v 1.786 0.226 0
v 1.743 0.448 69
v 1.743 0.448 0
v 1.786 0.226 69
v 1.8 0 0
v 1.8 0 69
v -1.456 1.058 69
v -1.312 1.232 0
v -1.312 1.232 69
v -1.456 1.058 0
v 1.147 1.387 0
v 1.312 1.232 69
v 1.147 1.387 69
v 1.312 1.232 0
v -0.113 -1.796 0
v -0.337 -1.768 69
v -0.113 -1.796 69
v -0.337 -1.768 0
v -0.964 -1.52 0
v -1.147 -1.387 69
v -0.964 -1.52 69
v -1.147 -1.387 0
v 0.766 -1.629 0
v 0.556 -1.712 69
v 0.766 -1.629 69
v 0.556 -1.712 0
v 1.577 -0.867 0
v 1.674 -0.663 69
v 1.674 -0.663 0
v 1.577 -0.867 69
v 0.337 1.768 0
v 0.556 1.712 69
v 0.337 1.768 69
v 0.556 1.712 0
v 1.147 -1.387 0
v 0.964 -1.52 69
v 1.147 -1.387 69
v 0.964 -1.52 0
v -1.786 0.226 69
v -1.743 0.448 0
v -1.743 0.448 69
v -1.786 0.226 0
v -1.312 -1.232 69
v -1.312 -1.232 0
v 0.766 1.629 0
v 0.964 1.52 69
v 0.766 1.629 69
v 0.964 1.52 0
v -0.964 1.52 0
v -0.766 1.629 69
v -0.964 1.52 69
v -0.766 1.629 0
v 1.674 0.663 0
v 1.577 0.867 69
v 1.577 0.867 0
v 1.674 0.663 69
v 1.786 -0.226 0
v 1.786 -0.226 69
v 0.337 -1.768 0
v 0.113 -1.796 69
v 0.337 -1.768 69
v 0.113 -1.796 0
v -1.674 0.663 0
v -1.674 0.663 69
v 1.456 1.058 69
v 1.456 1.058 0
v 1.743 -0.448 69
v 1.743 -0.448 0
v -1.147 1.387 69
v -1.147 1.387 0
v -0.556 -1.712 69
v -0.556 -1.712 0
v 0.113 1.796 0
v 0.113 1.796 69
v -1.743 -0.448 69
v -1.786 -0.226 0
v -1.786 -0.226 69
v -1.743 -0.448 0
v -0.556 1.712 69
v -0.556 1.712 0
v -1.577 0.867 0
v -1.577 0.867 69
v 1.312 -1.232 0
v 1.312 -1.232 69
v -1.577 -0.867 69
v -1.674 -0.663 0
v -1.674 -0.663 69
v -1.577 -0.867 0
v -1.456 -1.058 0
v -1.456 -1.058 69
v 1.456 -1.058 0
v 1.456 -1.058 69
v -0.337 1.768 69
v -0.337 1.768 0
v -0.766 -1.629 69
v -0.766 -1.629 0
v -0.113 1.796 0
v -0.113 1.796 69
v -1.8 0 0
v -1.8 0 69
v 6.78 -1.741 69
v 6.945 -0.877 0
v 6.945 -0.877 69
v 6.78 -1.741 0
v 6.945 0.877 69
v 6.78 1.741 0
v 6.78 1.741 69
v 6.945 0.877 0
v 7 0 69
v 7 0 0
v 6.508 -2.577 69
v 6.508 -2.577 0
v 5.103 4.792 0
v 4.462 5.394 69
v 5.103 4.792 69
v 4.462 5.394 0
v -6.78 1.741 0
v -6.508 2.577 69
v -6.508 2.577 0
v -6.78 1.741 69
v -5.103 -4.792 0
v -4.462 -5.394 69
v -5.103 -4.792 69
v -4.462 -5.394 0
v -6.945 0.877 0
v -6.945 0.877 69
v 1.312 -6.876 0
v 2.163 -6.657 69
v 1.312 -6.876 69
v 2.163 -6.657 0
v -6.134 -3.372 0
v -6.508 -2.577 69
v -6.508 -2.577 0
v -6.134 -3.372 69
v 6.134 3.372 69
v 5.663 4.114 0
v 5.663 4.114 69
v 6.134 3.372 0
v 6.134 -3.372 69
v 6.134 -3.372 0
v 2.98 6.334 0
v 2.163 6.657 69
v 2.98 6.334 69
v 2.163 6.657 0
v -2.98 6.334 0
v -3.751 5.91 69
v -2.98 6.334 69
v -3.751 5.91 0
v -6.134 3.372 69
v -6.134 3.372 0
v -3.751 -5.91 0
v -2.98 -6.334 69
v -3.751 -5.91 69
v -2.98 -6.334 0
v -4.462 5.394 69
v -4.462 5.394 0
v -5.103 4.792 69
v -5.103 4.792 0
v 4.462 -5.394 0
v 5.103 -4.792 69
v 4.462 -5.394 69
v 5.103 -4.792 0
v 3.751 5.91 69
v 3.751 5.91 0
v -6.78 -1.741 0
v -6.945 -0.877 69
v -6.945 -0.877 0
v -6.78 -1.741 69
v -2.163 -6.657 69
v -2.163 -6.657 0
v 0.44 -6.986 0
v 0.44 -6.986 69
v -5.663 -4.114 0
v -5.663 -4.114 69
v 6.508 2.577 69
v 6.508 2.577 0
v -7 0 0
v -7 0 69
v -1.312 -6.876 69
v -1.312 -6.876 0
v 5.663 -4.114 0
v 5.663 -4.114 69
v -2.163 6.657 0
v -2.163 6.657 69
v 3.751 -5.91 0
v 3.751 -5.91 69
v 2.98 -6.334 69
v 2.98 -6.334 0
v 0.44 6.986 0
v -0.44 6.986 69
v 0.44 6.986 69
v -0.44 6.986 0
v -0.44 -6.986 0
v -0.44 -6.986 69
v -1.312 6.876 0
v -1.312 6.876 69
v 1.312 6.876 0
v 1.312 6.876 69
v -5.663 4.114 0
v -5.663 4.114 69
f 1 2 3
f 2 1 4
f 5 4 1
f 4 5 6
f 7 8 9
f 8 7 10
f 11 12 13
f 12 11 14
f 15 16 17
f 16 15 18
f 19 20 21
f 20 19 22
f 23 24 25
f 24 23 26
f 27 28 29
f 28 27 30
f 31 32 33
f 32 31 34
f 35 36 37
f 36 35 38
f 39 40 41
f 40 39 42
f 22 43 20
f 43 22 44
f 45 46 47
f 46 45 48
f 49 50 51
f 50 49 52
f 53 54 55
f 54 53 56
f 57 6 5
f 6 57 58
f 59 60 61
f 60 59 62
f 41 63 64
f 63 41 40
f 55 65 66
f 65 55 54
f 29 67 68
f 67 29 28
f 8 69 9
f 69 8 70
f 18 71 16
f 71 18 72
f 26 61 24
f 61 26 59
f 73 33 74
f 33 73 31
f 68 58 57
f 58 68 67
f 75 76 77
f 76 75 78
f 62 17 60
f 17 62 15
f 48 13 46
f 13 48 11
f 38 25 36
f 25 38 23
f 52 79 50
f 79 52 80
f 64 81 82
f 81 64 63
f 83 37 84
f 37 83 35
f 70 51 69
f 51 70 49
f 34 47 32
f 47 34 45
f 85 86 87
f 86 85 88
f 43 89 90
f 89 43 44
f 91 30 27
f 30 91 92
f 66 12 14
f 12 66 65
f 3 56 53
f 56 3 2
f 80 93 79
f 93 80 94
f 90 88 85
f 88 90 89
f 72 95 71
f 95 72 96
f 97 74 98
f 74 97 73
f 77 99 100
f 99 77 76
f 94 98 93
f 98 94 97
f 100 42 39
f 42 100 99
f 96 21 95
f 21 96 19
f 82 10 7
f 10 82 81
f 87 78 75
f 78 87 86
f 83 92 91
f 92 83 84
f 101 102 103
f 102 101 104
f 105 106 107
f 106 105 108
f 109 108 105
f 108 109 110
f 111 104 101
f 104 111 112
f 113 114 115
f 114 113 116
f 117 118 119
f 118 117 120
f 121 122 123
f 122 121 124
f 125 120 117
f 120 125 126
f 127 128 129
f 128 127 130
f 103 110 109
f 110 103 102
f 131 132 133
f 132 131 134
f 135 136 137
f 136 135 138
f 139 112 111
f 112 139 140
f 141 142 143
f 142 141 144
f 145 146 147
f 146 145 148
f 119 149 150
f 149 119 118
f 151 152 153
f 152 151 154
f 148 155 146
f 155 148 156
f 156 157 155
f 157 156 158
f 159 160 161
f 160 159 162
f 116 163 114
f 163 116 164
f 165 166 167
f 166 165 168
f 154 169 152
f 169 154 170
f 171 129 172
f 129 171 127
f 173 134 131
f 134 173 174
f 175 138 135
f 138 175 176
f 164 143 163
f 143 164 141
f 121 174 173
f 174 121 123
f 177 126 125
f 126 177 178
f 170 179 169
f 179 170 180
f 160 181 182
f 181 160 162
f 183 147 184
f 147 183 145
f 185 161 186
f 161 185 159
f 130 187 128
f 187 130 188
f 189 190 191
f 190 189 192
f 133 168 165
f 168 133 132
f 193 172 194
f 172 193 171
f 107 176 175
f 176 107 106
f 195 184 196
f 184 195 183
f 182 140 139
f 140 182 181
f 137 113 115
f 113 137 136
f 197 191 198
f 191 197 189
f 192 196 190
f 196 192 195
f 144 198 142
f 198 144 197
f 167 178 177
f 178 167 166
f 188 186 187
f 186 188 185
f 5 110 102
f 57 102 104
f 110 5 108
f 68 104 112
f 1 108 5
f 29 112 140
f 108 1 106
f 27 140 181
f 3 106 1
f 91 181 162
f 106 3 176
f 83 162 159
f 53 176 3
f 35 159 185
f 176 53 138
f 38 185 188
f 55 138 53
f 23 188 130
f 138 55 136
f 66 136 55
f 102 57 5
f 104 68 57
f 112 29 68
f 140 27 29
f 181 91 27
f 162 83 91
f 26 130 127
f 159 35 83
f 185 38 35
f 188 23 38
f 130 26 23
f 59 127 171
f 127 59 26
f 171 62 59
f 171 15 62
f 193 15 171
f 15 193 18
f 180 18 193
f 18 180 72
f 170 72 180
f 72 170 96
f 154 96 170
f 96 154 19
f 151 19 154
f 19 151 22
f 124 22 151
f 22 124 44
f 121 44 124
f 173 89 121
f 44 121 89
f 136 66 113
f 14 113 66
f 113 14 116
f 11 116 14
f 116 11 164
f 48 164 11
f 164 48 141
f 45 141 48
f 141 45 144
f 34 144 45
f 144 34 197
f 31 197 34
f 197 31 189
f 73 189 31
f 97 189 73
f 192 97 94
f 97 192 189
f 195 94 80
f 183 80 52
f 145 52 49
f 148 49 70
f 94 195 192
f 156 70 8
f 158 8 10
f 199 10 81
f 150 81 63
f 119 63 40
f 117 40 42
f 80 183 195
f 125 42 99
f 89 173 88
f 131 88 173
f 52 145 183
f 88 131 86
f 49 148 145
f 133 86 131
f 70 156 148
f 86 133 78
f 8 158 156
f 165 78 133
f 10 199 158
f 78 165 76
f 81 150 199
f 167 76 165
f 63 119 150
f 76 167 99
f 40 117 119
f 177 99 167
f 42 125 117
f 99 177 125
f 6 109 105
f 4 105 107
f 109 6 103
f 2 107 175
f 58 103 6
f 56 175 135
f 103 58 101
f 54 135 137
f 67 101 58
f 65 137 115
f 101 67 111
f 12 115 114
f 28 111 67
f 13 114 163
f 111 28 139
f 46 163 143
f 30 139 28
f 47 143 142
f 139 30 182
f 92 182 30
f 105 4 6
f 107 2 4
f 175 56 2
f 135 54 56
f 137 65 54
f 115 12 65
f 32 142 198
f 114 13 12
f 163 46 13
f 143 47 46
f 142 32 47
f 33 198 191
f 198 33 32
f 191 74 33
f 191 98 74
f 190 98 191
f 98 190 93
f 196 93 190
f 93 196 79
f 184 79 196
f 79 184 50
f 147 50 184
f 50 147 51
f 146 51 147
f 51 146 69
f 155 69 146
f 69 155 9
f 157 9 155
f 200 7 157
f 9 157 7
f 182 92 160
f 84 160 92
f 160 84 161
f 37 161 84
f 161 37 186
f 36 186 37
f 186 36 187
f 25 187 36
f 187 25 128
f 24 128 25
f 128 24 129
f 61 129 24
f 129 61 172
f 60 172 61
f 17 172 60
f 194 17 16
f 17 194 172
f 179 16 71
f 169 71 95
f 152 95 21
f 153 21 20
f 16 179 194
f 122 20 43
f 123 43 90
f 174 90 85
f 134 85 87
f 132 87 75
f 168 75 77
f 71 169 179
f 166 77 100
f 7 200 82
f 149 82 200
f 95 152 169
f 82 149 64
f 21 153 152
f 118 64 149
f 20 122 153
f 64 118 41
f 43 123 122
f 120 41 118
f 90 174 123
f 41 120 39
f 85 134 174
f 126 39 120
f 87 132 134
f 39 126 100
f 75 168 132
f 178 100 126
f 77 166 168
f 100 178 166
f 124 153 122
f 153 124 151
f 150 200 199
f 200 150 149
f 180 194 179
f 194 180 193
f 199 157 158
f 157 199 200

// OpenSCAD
$fn = 50;


difference() {
	union() {
		cylinder(h = 69, r = 7.0000000000);
	}
	union() {
		translate(v = [0.0000000000, 0.0000000000, -100.0000000000]) {
			cylinder(h = 200, r = 1.8000000000);
		}
		cylinder(h = 69, r = 1.8000000000);
		cylinder(h = 69, r = 1.8000000000);
		cylinder(h = 69, r = 1.8000000000);
	}
}
